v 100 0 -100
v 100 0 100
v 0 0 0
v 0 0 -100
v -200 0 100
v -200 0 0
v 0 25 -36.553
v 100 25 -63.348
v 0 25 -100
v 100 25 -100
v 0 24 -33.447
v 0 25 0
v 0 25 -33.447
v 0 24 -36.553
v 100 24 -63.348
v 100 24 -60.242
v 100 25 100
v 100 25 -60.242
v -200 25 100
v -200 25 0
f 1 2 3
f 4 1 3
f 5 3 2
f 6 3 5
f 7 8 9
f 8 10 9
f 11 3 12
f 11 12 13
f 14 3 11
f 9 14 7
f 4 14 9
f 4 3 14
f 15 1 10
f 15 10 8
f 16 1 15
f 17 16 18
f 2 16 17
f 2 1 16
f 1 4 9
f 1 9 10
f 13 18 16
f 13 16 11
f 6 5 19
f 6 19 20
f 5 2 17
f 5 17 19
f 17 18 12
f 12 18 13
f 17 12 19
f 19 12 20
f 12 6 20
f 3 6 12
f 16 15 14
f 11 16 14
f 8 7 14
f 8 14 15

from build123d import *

# Parameters (mm, degrees)
BOSS_EXTRUDE1_DEPTH = 25
CUT_EXTRUDE1_DEPTH  = 1


with BuildPart() as part:
    # Sketch1 → Boss-Extrude1 (new body)
    with BuildSketch(Plane(origin=(0, 0, 0), x_dir=(1, 0, 0), z_dir=(0, 1, 0))):
        Polygon((0, 0), (0, 100), (100, 100), (100, -100), (-200, -100), (-200, 0), align=None)
    extrude(amount=BOSS_EXTRUDE1_DEPTH)

    # Sketch2 → Cut-Extrude1 (cut)
    with BuildSketch(Plane(origin=(0, 25, 0), x_dir=(1, 0, 0), z_dir=(0, 1, 0))):
        Polygon((150.414178645, 73.750443427), (-91.067277928, 9.045682152), (-91.843735063, 11.943459631), (149.637721509, 76.648220906), align=None)
    extrude(amount=-CUT_EXTRUDE1_DEPTH, mode=Mode.SUBTRACT)


solid = part.part
